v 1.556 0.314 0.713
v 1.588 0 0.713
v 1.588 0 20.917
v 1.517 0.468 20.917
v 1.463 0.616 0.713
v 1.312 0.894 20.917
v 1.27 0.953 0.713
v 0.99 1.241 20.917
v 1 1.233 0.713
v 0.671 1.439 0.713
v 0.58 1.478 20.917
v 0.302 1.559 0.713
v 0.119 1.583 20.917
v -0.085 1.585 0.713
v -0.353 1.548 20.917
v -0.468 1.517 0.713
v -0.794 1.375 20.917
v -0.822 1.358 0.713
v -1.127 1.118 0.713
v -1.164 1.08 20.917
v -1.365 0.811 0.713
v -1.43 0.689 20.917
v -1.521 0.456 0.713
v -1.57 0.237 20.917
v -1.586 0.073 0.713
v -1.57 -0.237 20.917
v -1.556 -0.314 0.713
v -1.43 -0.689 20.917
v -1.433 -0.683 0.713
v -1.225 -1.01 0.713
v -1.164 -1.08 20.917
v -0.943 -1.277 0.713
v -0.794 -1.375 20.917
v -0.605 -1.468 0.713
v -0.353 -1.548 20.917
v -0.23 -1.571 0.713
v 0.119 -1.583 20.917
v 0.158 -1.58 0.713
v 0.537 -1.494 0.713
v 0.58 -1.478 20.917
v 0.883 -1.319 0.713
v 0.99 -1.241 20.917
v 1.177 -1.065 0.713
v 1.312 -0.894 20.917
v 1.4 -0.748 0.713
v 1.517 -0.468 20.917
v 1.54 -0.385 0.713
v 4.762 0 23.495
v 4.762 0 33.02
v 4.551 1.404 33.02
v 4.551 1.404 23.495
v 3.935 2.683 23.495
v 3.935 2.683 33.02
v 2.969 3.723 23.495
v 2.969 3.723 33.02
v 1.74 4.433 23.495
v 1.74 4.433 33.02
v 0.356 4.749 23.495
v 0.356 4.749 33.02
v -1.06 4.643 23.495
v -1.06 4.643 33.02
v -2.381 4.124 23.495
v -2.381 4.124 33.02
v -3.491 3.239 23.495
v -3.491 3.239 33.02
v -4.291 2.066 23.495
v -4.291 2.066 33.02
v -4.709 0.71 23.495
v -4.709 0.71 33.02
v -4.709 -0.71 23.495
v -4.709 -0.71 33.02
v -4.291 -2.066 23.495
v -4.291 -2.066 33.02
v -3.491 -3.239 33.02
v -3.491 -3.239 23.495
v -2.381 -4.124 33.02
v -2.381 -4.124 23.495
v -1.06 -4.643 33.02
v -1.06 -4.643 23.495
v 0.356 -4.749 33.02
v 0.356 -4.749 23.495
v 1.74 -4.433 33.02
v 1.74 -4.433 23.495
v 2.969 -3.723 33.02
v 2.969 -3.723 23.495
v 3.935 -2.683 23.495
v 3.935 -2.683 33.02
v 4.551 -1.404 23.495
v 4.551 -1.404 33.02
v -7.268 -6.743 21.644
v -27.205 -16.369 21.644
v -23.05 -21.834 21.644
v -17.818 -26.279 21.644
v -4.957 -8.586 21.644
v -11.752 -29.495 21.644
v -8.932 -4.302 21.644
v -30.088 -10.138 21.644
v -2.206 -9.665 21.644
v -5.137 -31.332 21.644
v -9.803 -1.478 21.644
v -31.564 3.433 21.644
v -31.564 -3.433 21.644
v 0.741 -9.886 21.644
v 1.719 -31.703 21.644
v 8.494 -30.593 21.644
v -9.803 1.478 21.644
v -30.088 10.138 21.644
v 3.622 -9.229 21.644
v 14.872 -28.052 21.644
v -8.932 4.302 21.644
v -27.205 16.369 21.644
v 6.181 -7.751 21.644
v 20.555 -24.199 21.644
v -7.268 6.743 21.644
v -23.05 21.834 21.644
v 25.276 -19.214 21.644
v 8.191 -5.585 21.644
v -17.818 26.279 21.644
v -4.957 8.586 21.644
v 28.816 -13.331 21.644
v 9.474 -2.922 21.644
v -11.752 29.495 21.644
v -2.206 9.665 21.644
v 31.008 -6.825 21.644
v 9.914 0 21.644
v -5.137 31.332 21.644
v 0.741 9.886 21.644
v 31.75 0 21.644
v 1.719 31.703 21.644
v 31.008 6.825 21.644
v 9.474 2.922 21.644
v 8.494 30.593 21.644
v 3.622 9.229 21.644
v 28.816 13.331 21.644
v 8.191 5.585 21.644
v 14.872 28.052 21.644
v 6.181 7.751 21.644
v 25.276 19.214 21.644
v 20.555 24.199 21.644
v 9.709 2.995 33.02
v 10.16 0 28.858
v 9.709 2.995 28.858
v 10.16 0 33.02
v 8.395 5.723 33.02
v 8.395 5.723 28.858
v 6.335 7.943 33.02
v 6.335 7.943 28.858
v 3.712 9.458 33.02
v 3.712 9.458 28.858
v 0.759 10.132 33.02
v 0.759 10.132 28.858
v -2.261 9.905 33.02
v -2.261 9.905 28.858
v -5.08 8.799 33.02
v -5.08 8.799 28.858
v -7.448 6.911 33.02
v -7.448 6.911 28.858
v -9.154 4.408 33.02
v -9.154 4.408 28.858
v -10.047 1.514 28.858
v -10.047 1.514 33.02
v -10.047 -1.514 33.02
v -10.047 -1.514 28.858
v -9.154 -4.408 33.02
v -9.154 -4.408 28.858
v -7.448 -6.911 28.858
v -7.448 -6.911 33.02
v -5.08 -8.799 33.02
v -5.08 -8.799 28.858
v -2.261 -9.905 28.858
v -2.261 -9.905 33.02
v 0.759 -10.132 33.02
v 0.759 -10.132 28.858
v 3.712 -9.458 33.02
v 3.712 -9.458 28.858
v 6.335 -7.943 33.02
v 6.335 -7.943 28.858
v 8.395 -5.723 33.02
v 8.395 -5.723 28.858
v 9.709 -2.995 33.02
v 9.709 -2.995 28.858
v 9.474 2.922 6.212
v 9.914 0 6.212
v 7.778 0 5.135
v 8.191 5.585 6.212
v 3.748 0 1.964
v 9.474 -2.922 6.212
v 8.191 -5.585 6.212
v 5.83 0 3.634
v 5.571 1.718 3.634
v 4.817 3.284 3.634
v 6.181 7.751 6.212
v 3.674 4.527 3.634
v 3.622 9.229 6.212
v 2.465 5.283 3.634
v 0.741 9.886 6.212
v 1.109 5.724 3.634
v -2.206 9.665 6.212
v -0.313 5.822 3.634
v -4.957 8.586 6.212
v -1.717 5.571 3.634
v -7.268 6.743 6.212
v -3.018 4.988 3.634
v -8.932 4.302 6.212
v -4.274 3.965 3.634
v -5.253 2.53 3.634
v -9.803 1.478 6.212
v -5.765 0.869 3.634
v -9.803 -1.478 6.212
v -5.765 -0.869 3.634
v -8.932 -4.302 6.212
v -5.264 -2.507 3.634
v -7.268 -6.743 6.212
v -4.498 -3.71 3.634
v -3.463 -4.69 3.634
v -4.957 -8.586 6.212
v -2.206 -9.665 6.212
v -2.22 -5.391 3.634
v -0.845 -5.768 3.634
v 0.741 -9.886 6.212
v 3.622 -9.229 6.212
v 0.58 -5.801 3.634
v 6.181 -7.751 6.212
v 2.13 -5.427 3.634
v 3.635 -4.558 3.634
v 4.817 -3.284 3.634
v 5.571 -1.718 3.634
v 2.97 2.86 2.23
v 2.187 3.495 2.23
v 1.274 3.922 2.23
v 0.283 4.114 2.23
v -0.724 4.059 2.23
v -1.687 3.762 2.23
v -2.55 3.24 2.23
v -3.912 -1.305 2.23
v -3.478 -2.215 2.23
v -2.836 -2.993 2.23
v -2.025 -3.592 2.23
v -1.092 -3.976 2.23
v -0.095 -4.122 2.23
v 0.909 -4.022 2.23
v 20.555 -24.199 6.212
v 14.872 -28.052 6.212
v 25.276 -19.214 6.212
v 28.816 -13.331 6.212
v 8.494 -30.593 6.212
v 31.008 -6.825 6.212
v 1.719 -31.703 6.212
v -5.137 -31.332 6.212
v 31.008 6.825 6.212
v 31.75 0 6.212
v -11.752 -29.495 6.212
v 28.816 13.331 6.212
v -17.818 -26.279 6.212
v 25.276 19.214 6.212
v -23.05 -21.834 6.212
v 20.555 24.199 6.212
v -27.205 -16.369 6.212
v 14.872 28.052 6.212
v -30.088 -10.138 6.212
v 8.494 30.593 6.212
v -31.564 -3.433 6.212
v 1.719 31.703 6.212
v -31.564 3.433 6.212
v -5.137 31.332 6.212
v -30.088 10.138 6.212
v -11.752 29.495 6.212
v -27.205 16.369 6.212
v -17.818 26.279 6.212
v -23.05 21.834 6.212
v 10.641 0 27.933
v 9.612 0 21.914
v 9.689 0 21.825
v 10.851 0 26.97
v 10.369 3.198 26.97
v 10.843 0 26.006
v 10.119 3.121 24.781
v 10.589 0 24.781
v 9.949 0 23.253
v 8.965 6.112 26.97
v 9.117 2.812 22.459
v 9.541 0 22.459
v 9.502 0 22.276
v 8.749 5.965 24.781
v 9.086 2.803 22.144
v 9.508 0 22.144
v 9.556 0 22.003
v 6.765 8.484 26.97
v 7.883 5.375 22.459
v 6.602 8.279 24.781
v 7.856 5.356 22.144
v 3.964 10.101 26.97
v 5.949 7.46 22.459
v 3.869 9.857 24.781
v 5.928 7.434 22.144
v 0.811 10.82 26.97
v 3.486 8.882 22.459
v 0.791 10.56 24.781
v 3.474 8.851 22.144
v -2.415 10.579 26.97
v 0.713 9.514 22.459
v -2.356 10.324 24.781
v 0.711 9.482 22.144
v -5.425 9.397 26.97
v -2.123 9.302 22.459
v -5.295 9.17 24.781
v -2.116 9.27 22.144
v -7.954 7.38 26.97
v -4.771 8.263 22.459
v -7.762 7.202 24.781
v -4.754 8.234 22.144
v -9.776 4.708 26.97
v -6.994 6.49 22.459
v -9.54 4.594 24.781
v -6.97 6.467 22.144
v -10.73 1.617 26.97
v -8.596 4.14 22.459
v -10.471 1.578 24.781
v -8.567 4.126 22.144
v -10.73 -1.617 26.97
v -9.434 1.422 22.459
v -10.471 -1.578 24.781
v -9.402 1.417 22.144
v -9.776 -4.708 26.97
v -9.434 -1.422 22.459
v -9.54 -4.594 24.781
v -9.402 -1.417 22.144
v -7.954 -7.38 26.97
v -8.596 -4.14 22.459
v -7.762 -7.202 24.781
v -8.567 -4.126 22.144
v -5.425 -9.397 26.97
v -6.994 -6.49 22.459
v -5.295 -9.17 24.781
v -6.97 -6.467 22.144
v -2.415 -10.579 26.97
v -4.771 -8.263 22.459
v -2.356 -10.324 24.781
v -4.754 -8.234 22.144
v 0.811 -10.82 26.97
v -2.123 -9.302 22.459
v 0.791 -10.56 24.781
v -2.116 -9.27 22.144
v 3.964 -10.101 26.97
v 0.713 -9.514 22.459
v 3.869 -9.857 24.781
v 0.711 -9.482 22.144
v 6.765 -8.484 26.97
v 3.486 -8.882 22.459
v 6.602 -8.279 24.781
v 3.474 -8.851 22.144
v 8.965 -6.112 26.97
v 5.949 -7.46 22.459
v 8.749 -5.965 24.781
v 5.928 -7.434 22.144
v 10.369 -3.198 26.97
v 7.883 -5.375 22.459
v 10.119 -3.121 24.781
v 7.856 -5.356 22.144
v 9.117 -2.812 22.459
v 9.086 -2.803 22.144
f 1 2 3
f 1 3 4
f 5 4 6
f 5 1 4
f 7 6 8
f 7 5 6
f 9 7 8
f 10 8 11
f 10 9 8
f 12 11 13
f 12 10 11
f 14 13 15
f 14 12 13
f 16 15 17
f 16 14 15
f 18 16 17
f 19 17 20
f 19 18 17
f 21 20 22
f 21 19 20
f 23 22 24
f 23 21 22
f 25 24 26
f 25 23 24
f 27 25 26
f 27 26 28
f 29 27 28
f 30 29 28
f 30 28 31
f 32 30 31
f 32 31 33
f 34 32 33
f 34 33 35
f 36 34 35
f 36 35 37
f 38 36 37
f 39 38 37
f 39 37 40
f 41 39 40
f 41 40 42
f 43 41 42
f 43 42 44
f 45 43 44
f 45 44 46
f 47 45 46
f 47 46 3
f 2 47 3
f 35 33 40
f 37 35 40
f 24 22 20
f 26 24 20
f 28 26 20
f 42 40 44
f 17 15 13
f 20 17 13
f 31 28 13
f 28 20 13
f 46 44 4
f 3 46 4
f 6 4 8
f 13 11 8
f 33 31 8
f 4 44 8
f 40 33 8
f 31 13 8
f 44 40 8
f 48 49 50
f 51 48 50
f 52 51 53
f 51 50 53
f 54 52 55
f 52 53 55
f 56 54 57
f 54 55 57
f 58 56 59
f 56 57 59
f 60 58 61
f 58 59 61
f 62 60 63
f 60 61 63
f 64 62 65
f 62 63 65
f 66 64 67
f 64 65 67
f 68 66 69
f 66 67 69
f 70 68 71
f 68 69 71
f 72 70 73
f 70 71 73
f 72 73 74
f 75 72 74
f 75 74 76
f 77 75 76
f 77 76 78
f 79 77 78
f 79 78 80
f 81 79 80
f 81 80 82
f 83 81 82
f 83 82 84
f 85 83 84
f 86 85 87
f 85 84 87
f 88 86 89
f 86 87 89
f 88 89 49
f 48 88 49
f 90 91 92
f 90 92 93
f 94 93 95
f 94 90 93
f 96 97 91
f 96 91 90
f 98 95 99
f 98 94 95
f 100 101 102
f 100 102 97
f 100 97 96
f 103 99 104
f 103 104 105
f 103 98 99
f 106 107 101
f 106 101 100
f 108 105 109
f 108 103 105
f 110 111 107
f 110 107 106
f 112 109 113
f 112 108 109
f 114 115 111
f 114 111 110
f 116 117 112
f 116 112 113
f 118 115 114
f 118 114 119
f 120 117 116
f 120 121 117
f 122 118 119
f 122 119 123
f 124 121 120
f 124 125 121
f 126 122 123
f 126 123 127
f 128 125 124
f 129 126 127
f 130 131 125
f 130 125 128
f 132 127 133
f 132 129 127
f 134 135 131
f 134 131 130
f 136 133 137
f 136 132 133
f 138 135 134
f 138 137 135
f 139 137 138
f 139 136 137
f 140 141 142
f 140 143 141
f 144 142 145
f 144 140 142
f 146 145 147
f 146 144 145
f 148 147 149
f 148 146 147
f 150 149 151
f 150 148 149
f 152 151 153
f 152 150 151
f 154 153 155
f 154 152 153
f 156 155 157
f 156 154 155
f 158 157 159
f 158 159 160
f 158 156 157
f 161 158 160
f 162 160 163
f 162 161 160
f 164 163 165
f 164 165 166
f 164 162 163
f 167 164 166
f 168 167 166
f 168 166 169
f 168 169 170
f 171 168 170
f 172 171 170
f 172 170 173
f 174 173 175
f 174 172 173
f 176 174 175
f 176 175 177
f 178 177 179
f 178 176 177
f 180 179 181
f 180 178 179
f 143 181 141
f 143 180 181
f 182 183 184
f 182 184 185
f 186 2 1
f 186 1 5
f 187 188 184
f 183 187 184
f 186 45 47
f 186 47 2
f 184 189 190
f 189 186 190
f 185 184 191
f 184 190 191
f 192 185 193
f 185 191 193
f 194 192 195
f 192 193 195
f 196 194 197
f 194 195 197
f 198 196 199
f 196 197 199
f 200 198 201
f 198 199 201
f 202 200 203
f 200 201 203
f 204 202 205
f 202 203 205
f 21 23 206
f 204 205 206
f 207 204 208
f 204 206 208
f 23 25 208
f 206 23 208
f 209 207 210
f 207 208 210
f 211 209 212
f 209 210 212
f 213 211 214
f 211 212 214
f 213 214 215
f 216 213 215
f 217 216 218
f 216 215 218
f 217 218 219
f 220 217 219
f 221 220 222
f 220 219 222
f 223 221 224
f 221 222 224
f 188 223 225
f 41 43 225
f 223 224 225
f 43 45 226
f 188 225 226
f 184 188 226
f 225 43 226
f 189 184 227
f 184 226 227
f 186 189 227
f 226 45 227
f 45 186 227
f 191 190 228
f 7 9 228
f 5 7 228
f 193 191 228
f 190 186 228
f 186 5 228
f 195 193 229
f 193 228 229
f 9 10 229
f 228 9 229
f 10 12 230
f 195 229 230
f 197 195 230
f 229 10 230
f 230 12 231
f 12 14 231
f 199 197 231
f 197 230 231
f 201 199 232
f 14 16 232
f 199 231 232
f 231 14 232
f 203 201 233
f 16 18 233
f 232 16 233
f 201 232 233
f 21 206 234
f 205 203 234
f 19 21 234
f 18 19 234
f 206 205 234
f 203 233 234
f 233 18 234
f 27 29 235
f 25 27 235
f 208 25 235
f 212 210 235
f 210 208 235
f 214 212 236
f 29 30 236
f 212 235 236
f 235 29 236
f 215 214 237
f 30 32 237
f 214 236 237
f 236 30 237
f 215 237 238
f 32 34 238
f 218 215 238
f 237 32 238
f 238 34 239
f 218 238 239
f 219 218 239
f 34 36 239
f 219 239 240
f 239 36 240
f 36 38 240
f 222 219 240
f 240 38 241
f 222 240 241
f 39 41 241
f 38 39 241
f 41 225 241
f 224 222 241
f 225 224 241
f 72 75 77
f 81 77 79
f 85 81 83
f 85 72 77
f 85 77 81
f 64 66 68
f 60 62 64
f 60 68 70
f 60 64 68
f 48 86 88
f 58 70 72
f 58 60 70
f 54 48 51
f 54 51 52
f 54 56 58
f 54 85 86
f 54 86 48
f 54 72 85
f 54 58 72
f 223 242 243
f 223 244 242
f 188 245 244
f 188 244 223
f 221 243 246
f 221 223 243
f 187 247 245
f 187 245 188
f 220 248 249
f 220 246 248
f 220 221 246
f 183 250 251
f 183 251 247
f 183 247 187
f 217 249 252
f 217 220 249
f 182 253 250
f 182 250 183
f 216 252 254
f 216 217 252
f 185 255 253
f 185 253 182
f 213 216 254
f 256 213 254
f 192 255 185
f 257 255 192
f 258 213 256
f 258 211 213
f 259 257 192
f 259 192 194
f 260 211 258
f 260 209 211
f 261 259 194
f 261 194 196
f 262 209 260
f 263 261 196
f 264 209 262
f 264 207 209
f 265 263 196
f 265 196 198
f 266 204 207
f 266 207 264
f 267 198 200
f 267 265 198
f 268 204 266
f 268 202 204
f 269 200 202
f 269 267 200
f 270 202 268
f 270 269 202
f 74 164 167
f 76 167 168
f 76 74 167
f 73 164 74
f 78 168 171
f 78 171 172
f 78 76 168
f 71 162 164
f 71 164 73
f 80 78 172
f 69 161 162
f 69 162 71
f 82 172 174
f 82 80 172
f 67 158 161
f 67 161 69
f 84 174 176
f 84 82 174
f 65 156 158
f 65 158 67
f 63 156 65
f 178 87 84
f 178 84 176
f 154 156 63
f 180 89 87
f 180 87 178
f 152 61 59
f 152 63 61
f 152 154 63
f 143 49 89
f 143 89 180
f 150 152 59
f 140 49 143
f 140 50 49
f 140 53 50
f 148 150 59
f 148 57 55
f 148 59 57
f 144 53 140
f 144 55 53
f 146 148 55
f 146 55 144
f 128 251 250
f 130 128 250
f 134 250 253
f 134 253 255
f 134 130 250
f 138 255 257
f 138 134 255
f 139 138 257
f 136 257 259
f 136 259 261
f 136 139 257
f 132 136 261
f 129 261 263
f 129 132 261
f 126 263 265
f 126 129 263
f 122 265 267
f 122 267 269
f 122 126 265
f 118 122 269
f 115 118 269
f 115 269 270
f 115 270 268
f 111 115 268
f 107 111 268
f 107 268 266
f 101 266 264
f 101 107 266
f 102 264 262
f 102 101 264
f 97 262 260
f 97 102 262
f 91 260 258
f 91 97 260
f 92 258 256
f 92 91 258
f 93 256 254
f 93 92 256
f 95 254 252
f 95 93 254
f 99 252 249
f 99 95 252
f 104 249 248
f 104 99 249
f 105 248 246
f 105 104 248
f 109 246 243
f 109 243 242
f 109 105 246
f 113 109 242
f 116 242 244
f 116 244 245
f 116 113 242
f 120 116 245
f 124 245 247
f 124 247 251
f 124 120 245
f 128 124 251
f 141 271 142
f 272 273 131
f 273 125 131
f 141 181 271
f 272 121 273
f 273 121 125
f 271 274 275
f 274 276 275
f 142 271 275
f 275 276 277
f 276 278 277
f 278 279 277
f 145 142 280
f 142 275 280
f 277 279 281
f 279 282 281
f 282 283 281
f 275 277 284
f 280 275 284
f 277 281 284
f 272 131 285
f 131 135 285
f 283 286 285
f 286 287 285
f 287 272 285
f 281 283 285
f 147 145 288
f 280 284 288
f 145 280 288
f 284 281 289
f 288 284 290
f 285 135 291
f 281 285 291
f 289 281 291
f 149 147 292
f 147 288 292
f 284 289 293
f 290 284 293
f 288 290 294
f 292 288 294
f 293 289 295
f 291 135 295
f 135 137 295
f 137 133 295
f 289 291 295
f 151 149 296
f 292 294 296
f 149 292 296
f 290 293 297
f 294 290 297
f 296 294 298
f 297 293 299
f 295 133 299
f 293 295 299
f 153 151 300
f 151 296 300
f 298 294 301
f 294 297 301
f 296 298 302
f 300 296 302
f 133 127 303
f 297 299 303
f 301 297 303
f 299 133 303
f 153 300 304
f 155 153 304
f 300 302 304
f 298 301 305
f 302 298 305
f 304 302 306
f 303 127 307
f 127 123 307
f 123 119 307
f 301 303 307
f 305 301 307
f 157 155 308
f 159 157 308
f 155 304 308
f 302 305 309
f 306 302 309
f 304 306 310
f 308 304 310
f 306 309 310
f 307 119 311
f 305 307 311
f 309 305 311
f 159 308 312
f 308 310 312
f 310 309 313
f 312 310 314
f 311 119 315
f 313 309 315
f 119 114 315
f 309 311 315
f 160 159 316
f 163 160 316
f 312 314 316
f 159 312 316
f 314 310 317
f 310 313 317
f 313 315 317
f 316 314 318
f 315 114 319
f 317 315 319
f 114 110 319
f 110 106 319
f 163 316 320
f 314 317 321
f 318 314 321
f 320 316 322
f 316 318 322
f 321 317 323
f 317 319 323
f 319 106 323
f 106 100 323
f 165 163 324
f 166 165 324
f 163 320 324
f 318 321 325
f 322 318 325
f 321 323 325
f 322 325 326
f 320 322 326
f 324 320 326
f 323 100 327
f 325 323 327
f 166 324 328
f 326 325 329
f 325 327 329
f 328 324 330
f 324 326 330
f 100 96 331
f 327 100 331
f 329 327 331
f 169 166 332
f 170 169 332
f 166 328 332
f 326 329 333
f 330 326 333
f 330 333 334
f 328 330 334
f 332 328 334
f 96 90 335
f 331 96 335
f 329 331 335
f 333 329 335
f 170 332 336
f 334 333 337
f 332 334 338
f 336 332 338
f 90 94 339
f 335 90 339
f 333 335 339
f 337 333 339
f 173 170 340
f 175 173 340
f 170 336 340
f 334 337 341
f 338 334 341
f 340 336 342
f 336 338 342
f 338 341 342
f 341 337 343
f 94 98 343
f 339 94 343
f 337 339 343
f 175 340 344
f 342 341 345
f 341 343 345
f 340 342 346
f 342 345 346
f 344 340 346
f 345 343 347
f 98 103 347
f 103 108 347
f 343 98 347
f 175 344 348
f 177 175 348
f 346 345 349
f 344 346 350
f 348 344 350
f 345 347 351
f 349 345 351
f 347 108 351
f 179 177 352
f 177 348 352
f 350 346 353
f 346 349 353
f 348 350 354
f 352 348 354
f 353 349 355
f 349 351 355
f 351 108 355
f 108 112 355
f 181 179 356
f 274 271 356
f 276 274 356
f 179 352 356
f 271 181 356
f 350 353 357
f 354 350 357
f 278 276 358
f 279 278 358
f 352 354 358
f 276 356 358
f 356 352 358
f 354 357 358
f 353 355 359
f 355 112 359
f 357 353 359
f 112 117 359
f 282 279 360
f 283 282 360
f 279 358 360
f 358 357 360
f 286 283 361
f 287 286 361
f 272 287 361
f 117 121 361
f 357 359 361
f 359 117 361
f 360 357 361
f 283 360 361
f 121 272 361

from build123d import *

# Parameters (mm, degrees)
F2_R     = 4.7625
F3_DEPTH = 9.525
F4_R     = 1.5875
F5_DEPTH = 20.9169


with BuildPart() as f1:
    # F0 (on Front) → F1 (revolve)
    with BuildSketch(Plane.XZ):
        with BuildLine():
            Line((0, 33.02), (0, 0))
            add(Edge.make_bspline(
                [(9.9140361241, 6.2119723298), (5.3911280841, 4.3766633401), (5.9293914696, 2.4382627623), (0, 0)],
                knots=[0.8288382909, 0.8288382909, 0.8288382909, 0.8288382909, 1, 1, 1, 1], degree=3))
            Line((9.9140361241, 6.2119723298), (9.9140361241, 13.9279487485))
            Line((9.9140361241, 13.9279487485), (9.9140361241, 21.6439251673))
            add(Edge.make_bspline(
                [(10.16, 28.857588768), (11.523254674, 26.9400200202), (10.1686139157, 23.2379404383), (9.2103585852, 22.1157759581), (9.9140361241, 21.6439251673)],
                knots=[0.1658124621, 0.1658124621, 0.1658124621, 0.1658124621, 0.2850146806, 0.3472062164, 0.3472062164, 0.3472062164, 0.3472062164], degree=3))
            add(Edge.make_bspline(
                [(0.6915654728, 33.02), (3.173352175, 32.8639093886), (8.4465738437, 31.2677125048), (10.16, 28.857588768)],
                knots=[0.0159914469, 0.0159914469, 0.0159914469, 0.0159914469, 0.1658124621, 0.1658124621, 0.1658124621, 0.1658124621], degree=3))
            Line((0.6915654728, 33.02), (0, 33.02))
        make_face()
        with BuildLine():
            Line((10.16, 33.02), (0.6915654728, 33.02))
            add(Edge.make_bspline(
                [(0.6915654728, 33.02), (3.173352175, 32.8639093886), (8.4465738437, 31.2677125048), (10.16, 28.857588768)],
                knots=[0.0159914469, 0.0159914469, 0.0159914469, 0.0159914469, 0.1658124621, 0.1658124621, 0.1658124621, 0.1658124621], degree=3))
            Line((10.16, 28.857588768), (10.16, 33.02))
        make_face()
        with BuildLine():
            Line((9.9140361241, 13.9279487485), (9.9140361241, 6.2119723298))
            add(Edge.make_bspline(
                [(31.75, 13.483504906), (30.91482321, 10.9141221863), (15.9329484904, 8.6543310681), (9.9140361241, 6.2119723298)],
                knots=[0.60106286, 0.60106286, 0.60106286, 0.60106286, 0.8288382909, 0.8288382909, 0.8288382909, 0.8288382909], degree=3))
            Line((31.75, 13.483504906), (31.75, 13.9279487485))
            Line((31.75, 13.9279487485), (9.9140361241, 13.9279487485))
        make_face()
        with BuildLine():
            Line((9.9140361241, 21.6439251673), (9.9140361241, 13.9279487485))
            Line((9.9140361241, 13.9279487485), (31.75, 13.9279487485))
            add(Edge.make_bspline(
                [(9.9140361241, 21.6439251673), (12.6387933507, 19.8168399172), (30.8403124733, 16.6836184602), (31.75, 13.9279487485)],
                knots=[0.3472062164, 0.3472062164, 0.3472062164, 0.3472062164, 0.5880222536, 0.5880222536, 0.5880222536, 0.5880222536], degree=3))
        make_face()
        with BuildLine():
            add(Edge.make_bspline(
                [(9.9140361241, 21.6439251673), (12.6387933507, 19.8168399172), (30.8403124733, 16.6836184602), (31.75, 13.9279487485)],
                knots=[0.3472062164, 0.3472062164, 0.3472062164, 0.3472062164, 0.5880222536, 0.5880222536, 0.5880222536, 0.5880222536], degree=3))
            Line((31.75, 13.9279487485), (31.75, 21.6439251673))
            Line((31.75, 21.6439251673), (9.9140361241, 21.6439251673))
        make_face()
        with BuildLine():
            add(Edge.make_bspline(
                [(31.75, 13.483504906), (30.91482321, 10.9141221863), (15.9329484904, 8.6543310681), (9.9140361241, 6.2119723298)],
                knots=[0.60106286, 0.60106286, 0.60106286, 0.60106286, 0.8288382909, 0.8288382909, 0.8288382909, 0.8288382909], degree=3))
            Line((9.9140361241, 6.2119723298), (31.75, 6.2119723298))
            Line((31.75, 6.2119723298), (31.75, 13.483504906))
        make_face()
    revolve(axis=Axis((0, 0, 16.51), (0, 0, 1)))

    # F2 (on face) → F3 (cut)
    with BuildSketch(Plane.XY.offset(33.02)):
        Circle(F2_R)
    extrude(amount=-F3_DEPTH, mode=Mode.SUBTRACT)

    # F4 (on Top) → F5 (cut)
    with BuildSketch(Plane.XY):
        Circle(F4_R)
    extrude(amount=F5_DEPTH, mode=Mode.SUBTRACT)


solid = f1.part
